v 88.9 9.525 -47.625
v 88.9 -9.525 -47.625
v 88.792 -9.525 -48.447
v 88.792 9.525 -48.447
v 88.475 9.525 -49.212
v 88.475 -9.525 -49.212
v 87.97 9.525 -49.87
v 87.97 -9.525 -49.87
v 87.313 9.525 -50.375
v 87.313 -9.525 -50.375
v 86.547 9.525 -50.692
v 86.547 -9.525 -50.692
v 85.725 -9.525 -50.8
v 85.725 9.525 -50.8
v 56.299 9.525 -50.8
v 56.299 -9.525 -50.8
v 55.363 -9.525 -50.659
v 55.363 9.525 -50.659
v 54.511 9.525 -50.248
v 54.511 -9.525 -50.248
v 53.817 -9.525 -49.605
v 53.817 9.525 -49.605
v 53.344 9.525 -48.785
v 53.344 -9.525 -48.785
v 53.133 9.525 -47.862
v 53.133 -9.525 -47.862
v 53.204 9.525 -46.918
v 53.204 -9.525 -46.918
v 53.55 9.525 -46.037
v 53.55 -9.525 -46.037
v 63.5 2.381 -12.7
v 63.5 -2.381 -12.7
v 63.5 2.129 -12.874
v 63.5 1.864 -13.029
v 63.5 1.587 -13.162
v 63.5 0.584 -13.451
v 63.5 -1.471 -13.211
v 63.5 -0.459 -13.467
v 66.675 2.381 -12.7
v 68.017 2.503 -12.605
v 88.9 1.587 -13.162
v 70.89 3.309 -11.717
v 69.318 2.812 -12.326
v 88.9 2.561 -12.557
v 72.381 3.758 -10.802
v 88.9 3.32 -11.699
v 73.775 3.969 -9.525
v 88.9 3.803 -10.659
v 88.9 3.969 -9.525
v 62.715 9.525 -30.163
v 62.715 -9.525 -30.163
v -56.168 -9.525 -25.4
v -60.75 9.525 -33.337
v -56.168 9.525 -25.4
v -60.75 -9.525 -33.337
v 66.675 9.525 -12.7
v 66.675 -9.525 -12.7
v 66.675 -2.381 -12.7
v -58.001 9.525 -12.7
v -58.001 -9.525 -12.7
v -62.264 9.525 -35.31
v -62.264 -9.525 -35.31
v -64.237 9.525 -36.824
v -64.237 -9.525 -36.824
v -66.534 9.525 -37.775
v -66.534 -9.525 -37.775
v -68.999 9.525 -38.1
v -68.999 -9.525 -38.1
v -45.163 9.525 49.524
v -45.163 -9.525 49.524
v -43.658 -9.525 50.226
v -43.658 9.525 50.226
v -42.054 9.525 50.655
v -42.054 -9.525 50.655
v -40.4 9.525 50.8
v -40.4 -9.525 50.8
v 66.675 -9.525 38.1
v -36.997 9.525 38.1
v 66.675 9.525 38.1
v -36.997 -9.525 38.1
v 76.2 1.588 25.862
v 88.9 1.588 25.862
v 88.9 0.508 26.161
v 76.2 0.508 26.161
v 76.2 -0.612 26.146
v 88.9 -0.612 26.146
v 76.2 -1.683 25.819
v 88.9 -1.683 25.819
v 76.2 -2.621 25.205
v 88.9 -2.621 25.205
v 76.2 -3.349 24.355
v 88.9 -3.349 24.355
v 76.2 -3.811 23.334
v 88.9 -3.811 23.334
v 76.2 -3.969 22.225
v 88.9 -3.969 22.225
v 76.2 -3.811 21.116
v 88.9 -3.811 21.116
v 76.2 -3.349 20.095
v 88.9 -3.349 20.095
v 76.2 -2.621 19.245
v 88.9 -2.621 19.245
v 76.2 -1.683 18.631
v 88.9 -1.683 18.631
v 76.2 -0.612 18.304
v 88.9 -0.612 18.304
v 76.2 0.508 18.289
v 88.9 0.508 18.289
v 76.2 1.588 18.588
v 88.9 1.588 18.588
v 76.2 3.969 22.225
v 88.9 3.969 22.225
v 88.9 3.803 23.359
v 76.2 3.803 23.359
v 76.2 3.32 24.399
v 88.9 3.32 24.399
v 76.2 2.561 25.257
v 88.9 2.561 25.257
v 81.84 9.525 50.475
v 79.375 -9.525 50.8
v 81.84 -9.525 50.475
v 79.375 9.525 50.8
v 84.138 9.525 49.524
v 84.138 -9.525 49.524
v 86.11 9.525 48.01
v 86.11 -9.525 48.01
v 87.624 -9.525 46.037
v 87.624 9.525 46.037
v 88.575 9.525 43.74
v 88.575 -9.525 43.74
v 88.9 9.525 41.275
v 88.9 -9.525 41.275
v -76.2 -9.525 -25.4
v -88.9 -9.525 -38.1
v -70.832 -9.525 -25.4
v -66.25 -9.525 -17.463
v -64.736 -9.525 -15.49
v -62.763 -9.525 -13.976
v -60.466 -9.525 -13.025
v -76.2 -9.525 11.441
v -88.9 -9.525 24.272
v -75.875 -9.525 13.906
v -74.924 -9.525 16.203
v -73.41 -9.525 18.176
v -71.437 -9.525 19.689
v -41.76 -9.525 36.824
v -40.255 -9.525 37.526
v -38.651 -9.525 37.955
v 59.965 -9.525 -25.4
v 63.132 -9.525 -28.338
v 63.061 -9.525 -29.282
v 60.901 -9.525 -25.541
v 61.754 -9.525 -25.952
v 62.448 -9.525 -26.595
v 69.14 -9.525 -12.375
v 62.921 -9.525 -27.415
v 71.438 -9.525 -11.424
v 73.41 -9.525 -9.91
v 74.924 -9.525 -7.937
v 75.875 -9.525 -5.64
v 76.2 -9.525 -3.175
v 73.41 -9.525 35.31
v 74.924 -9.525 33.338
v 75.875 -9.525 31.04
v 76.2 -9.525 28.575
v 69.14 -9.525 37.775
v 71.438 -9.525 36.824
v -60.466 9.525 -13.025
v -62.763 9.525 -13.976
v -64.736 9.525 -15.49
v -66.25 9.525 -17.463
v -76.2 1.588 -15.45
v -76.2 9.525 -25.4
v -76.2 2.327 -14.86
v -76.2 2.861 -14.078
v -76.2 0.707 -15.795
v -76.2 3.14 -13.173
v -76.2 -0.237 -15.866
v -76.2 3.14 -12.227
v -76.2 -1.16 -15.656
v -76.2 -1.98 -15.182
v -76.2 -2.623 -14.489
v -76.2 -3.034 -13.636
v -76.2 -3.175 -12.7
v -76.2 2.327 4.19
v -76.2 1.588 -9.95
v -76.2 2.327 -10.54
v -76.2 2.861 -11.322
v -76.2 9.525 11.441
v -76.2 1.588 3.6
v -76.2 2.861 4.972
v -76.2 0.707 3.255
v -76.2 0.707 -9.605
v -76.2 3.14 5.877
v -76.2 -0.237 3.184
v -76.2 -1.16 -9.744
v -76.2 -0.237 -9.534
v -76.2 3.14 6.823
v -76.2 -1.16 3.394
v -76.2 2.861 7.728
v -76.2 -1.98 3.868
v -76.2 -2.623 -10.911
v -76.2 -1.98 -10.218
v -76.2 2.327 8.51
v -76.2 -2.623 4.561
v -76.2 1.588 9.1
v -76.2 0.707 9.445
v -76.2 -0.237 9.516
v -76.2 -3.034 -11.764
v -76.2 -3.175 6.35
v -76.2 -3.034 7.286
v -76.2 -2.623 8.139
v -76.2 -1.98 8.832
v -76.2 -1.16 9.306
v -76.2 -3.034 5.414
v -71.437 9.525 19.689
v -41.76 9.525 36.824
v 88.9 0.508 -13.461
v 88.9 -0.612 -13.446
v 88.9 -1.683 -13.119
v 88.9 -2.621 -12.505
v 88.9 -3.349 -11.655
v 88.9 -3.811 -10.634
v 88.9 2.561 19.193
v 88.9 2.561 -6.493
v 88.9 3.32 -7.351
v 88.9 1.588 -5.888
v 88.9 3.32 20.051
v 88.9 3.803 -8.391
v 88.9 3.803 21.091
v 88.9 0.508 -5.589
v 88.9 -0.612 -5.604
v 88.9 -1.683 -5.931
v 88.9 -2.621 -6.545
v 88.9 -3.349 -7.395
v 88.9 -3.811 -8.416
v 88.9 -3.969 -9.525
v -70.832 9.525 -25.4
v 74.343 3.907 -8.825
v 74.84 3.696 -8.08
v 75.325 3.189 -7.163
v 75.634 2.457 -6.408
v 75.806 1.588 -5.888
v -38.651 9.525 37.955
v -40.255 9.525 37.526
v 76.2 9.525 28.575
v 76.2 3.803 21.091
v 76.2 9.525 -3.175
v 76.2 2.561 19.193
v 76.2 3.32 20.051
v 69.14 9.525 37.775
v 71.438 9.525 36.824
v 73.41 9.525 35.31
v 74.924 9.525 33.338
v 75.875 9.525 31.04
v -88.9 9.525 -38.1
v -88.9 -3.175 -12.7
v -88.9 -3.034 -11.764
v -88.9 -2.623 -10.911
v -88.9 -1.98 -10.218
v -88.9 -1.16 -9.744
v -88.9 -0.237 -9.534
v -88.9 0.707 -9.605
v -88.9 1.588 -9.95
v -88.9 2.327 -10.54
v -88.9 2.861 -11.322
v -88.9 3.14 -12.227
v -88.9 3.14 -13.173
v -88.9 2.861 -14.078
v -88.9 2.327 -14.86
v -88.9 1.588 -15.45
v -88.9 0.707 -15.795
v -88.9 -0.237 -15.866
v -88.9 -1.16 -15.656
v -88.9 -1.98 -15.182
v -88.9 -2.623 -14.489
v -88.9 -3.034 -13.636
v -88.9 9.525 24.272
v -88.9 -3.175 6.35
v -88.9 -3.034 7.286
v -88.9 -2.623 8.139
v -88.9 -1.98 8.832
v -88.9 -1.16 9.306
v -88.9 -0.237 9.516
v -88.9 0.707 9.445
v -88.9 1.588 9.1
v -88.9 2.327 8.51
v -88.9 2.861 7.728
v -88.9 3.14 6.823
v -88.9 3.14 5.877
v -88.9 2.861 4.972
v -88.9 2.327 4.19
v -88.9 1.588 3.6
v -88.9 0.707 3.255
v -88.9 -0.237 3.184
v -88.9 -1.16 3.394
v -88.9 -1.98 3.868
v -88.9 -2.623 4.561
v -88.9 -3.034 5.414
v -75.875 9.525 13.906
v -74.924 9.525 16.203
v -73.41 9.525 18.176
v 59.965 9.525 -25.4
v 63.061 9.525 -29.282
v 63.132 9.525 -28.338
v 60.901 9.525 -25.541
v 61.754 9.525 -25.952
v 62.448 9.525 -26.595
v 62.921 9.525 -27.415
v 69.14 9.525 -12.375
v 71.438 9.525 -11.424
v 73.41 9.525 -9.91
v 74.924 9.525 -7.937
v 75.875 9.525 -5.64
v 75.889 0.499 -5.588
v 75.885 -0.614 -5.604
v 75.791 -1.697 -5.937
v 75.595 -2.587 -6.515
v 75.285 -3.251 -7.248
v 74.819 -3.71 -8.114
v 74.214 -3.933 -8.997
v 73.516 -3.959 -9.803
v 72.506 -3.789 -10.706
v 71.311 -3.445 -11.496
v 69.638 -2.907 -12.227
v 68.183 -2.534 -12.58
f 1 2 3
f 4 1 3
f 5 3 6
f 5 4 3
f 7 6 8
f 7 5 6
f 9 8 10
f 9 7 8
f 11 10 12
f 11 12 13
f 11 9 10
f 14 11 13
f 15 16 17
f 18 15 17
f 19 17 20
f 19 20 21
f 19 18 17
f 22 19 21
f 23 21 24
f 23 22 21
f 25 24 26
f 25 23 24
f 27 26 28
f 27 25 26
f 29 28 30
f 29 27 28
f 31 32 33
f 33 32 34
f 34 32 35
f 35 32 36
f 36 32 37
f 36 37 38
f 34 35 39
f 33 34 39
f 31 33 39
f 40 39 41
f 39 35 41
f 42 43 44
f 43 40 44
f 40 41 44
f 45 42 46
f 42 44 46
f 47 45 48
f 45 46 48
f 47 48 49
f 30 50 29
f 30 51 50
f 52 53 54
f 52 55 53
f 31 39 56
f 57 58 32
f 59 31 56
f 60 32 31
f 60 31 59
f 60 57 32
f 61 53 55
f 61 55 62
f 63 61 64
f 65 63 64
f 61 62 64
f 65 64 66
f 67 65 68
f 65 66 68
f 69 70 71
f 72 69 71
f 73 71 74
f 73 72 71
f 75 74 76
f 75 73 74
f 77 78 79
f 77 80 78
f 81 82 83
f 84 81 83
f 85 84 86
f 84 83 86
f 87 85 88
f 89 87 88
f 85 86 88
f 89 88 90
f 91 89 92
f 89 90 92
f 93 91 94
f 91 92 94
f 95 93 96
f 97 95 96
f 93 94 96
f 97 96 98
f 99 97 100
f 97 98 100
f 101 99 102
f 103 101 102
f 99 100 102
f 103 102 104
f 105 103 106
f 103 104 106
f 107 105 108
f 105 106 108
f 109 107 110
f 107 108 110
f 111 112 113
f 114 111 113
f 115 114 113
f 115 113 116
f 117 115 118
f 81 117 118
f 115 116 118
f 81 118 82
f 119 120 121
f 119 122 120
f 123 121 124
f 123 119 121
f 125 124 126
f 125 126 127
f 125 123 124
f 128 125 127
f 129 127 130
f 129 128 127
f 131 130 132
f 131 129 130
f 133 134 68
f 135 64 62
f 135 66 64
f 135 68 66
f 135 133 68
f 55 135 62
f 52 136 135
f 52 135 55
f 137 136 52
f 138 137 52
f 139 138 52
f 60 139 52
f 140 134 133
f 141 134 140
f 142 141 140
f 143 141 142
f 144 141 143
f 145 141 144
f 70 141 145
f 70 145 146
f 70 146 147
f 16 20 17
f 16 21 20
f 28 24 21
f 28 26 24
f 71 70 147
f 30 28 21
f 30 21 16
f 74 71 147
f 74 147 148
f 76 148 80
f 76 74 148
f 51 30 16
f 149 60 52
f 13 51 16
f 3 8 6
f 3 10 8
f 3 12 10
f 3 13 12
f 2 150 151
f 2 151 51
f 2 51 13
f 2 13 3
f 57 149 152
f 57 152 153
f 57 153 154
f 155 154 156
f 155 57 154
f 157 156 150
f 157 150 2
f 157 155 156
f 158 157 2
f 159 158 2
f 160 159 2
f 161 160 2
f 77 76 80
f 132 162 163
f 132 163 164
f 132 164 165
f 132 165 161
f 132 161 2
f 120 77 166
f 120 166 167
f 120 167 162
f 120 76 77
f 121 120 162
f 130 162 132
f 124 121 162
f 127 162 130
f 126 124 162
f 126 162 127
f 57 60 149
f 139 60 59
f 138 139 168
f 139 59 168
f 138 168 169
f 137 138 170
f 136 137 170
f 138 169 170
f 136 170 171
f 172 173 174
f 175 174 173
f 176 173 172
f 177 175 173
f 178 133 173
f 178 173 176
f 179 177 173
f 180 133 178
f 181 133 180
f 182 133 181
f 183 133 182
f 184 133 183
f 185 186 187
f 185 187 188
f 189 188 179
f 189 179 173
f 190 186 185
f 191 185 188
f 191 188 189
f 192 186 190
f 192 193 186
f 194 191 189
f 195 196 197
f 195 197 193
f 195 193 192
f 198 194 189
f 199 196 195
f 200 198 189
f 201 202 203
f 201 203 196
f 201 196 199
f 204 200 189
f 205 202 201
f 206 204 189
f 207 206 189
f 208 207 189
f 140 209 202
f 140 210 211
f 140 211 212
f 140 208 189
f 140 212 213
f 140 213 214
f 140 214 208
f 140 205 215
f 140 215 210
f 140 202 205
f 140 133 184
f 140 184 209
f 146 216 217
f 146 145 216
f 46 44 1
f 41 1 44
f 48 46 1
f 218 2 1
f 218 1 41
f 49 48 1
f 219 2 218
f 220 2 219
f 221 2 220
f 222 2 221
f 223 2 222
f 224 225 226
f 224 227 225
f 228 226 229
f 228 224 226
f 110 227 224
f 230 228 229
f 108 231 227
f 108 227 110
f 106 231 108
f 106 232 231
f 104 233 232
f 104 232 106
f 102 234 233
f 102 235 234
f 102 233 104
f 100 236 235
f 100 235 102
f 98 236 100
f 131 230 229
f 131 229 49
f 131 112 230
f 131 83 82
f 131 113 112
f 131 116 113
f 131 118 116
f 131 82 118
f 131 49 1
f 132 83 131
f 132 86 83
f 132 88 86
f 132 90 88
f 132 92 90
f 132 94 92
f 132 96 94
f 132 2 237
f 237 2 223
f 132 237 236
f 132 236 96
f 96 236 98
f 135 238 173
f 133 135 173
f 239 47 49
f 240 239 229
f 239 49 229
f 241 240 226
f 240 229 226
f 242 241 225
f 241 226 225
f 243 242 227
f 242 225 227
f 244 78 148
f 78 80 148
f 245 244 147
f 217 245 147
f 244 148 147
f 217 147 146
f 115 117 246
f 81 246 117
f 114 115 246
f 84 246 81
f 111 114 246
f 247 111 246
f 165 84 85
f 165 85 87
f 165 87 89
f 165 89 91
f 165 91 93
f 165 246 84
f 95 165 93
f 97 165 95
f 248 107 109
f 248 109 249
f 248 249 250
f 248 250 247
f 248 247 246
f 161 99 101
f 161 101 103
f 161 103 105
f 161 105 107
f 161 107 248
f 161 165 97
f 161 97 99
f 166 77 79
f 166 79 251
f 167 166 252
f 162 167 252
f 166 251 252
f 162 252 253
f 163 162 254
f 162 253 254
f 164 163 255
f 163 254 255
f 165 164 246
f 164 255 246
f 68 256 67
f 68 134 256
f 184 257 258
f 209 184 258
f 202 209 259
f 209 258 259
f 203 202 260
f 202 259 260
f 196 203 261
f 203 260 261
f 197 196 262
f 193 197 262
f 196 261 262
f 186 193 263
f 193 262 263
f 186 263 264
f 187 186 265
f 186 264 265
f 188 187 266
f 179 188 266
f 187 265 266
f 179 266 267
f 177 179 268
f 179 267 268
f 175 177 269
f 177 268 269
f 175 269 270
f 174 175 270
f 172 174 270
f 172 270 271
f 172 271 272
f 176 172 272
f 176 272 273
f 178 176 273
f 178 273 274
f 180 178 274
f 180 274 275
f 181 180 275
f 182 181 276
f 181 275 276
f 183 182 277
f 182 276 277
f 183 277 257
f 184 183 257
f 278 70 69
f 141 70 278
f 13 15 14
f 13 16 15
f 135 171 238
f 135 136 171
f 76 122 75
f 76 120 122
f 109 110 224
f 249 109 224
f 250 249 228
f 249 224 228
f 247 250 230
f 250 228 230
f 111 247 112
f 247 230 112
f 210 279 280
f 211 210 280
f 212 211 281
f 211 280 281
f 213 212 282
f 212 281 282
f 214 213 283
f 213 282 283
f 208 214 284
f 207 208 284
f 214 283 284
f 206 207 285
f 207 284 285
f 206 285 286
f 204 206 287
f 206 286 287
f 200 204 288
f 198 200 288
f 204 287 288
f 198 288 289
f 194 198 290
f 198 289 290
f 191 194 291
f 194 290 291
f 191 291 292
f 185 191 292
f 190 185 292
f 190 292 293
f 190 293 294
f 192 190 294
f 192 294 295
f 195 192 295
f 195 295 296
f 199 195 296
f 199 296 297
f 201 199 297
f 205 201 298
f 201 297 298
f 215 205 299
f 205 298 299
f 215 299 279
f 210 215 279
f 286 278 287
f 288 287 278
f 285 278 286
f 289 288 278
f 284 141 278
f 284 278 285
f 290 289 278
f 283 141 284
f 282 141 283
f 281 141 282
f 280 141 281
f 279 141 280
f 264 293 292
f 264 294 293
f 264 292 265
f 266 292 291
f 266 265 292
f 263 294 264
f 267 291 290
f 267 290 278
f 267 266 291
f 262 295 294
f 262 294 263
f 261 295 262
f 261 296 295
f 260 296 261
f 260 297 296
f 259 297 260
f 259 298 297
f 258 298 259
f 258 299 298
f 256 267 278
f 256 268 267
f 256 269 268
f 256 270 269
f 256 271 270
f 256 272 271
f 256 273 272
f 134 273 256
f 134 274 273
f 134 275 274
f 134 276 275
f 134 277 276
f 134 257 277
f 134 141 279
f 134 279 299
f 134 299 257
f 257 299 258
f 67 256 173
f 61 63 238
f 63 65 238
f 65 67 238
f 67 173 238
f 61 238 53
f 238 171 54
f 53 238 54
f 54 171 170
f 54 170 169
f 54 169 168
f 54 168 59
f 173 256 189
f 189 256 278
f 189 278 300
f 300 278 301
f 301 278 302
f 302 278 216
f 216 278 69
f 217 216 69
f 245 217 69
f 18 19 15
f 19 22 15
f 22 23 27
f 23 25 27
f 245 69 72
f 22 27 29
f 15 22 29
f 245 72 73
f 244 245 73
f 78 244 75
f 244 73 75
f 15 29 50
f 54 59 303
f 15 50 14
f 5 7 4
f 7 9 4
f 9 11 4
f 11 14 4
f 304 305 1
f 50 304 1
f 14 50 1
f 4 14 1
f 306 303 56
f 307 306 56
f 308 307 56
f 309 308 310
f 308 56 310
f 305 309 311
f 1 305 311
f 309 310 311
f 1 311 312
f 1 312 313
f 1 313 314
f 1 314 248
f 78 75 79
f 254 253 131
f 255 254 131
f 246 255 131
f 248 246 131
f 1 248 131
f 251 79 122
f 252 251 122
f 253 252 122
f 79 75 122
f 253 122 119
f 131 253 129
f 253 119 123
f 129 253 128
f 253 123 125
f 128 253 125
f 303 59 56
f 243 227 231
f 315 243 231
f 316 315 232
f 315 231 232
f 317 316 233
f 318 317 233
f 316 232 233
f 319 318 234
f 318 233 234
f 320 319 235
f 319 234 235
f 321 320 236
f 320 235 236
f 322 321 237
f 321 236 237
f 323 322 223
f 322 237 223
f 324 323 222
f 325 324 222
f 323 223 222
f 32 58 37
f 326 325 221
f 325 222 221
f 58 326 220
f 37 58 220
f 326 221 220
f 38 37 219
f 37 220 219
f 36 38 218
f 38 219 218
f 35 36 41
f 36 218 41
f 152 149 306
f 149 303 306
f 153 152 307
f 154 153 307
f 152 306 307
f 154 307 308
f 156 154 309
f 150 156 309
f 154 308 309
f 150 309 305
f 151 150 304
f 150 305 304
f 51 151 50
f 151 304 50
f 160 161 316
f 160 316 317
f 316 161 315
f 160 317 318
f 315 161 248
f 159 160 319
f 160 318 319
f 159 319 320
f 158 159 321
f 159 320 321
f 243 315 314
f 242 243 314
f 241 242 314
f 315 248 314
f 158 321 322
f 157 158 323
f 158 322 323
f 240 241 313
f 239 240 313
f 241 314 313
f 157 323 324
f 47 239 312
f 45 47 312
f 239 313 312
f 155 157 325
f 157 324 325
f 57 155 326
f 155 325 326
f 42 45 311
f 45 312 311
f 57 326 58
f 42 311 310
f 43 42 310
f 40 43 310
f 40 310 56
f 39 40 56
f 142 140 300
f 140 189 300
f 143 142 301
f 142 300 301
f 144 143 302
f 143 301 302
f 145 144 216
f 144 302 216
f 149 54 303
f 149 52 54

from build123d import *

# Parameters (mm, degrees)
F1_DEPTH      = 9.525
F1_DEPTH_BACK = 9.525
F2_R          = 9.525
F3_R          = 3.175
F4_R          = 3.175
F5_DEPTH      = 12.7
F7_DEPTH      = 25.4


with BuildPart() as f1:
    # F0 (on Front) → F1 (new body, two sides)
    with BuildSketch(Plane.XZ) as f1_sk:
        Polygon((-42.952364, 50.8), (-88.9, 24.27212), (-88.9, -38.1), (-63.5, -38.1), (-56.167652, -25.4), (65.464697, -25.4), (50.8, -50.8), (88.9, -50.8), (88.9, 50.8), align=None)
        Polygon((-39.549409, 38.1), (76.2, 38.1), (76.2, -12.7), (-63.5, -12.7), (-70.832348, -25.4), (-76.2, -25.4), (-76.2, 16.939772), align=None, mode=Mode.SUBTRACT)
    extrude(amount=F1_DEPTH)
    extrude(f1_sk.sketch, amount=-F1_DEPTH_BACK)

    # F2
    f2_edges = [f1.edges().sort_by_distance(p)[0] for p in [
        (88.9, 0, 50.8),
        (-42.952364, 0, 50.8),
        (-63.5, 0, -38.1),
        (-76.2, 0, 16.939772),
        (-39.549409, 0, 38.1),
        (76.2, 0, 38.1),
        (-63.5, 0, -12.7),
        (76.2, 0, -12.7),
    ]]
    fillet(f2_edges, radius=F2_R)

    # F3
    f3_edges = [f1.edges().sort_by_distance(p)[0] for p in [
        (50.8, 0, -50.8),
        (65.464697, 0, -25.4),
        (88.9, 0, -50.8),
    ]]
    fillet(f3_edges, radius=F3_R)

    # F4 (on face) → F5 (cut, through all)
    with BuildSketch(Plane(origin=(-88.9, 0, 0), x_dir=(0, -1, 0), z_dir=(-1, 0, 0))):
        with Locations((0, -12.7)):
            Circle(F4_R)
        with Locations((0, 6.35)):
            Circle(F4_R)
    extrude(amount=-F5_DEPTH, mode=Mode.SUBTRACT)

    # F6 (on face) → F7 (cut)
    with BuildSketch(Plane.YZ.offset(88.9)):
        with BuildLine():
            Line((1.5875, -13.162419), (1.5875, -5.887581))
            ThreePointArc((1.5875, -5.887581), (-3.96875, -9.525), (1.5875, -13.162419))
        make_face()
        with BuildLine():
            ThreePointArc((3.96875, -9.525), (3.320494, -7.351226), (1.5875, -5.887581))
            Line((1.5875, -5.887581), (1.5875, -13.162419))
            ThreePointArc((1.5875, -13.162419), (3.320494, -11.698774), (3.96875, -9.525))
        make_face()
        with BuildLine():
            ThreePointArc((1.5875, 18.587581), (3.320494, 20.051226), (3.96875, 22.225))
            ThreePointArc((3.96875, 22.225), (3.320494, 24.398774), (1.5875, 25.862419))
            Line((1.5875, 25.862419), (1.5875, 18.587581))
        make_face()
        with BuildLine():
            Line((1.5875, 18.587581), (1.5875, 25.862419))
            ThreePointArc((1.5875, 25.862419), (-3.96875, 22.225), (1.5875, 18.587581))
        make_face()
    extrude(amount=-F7_DEPTH, mode=Mode.SUBTRACT)


solid = f1.part
